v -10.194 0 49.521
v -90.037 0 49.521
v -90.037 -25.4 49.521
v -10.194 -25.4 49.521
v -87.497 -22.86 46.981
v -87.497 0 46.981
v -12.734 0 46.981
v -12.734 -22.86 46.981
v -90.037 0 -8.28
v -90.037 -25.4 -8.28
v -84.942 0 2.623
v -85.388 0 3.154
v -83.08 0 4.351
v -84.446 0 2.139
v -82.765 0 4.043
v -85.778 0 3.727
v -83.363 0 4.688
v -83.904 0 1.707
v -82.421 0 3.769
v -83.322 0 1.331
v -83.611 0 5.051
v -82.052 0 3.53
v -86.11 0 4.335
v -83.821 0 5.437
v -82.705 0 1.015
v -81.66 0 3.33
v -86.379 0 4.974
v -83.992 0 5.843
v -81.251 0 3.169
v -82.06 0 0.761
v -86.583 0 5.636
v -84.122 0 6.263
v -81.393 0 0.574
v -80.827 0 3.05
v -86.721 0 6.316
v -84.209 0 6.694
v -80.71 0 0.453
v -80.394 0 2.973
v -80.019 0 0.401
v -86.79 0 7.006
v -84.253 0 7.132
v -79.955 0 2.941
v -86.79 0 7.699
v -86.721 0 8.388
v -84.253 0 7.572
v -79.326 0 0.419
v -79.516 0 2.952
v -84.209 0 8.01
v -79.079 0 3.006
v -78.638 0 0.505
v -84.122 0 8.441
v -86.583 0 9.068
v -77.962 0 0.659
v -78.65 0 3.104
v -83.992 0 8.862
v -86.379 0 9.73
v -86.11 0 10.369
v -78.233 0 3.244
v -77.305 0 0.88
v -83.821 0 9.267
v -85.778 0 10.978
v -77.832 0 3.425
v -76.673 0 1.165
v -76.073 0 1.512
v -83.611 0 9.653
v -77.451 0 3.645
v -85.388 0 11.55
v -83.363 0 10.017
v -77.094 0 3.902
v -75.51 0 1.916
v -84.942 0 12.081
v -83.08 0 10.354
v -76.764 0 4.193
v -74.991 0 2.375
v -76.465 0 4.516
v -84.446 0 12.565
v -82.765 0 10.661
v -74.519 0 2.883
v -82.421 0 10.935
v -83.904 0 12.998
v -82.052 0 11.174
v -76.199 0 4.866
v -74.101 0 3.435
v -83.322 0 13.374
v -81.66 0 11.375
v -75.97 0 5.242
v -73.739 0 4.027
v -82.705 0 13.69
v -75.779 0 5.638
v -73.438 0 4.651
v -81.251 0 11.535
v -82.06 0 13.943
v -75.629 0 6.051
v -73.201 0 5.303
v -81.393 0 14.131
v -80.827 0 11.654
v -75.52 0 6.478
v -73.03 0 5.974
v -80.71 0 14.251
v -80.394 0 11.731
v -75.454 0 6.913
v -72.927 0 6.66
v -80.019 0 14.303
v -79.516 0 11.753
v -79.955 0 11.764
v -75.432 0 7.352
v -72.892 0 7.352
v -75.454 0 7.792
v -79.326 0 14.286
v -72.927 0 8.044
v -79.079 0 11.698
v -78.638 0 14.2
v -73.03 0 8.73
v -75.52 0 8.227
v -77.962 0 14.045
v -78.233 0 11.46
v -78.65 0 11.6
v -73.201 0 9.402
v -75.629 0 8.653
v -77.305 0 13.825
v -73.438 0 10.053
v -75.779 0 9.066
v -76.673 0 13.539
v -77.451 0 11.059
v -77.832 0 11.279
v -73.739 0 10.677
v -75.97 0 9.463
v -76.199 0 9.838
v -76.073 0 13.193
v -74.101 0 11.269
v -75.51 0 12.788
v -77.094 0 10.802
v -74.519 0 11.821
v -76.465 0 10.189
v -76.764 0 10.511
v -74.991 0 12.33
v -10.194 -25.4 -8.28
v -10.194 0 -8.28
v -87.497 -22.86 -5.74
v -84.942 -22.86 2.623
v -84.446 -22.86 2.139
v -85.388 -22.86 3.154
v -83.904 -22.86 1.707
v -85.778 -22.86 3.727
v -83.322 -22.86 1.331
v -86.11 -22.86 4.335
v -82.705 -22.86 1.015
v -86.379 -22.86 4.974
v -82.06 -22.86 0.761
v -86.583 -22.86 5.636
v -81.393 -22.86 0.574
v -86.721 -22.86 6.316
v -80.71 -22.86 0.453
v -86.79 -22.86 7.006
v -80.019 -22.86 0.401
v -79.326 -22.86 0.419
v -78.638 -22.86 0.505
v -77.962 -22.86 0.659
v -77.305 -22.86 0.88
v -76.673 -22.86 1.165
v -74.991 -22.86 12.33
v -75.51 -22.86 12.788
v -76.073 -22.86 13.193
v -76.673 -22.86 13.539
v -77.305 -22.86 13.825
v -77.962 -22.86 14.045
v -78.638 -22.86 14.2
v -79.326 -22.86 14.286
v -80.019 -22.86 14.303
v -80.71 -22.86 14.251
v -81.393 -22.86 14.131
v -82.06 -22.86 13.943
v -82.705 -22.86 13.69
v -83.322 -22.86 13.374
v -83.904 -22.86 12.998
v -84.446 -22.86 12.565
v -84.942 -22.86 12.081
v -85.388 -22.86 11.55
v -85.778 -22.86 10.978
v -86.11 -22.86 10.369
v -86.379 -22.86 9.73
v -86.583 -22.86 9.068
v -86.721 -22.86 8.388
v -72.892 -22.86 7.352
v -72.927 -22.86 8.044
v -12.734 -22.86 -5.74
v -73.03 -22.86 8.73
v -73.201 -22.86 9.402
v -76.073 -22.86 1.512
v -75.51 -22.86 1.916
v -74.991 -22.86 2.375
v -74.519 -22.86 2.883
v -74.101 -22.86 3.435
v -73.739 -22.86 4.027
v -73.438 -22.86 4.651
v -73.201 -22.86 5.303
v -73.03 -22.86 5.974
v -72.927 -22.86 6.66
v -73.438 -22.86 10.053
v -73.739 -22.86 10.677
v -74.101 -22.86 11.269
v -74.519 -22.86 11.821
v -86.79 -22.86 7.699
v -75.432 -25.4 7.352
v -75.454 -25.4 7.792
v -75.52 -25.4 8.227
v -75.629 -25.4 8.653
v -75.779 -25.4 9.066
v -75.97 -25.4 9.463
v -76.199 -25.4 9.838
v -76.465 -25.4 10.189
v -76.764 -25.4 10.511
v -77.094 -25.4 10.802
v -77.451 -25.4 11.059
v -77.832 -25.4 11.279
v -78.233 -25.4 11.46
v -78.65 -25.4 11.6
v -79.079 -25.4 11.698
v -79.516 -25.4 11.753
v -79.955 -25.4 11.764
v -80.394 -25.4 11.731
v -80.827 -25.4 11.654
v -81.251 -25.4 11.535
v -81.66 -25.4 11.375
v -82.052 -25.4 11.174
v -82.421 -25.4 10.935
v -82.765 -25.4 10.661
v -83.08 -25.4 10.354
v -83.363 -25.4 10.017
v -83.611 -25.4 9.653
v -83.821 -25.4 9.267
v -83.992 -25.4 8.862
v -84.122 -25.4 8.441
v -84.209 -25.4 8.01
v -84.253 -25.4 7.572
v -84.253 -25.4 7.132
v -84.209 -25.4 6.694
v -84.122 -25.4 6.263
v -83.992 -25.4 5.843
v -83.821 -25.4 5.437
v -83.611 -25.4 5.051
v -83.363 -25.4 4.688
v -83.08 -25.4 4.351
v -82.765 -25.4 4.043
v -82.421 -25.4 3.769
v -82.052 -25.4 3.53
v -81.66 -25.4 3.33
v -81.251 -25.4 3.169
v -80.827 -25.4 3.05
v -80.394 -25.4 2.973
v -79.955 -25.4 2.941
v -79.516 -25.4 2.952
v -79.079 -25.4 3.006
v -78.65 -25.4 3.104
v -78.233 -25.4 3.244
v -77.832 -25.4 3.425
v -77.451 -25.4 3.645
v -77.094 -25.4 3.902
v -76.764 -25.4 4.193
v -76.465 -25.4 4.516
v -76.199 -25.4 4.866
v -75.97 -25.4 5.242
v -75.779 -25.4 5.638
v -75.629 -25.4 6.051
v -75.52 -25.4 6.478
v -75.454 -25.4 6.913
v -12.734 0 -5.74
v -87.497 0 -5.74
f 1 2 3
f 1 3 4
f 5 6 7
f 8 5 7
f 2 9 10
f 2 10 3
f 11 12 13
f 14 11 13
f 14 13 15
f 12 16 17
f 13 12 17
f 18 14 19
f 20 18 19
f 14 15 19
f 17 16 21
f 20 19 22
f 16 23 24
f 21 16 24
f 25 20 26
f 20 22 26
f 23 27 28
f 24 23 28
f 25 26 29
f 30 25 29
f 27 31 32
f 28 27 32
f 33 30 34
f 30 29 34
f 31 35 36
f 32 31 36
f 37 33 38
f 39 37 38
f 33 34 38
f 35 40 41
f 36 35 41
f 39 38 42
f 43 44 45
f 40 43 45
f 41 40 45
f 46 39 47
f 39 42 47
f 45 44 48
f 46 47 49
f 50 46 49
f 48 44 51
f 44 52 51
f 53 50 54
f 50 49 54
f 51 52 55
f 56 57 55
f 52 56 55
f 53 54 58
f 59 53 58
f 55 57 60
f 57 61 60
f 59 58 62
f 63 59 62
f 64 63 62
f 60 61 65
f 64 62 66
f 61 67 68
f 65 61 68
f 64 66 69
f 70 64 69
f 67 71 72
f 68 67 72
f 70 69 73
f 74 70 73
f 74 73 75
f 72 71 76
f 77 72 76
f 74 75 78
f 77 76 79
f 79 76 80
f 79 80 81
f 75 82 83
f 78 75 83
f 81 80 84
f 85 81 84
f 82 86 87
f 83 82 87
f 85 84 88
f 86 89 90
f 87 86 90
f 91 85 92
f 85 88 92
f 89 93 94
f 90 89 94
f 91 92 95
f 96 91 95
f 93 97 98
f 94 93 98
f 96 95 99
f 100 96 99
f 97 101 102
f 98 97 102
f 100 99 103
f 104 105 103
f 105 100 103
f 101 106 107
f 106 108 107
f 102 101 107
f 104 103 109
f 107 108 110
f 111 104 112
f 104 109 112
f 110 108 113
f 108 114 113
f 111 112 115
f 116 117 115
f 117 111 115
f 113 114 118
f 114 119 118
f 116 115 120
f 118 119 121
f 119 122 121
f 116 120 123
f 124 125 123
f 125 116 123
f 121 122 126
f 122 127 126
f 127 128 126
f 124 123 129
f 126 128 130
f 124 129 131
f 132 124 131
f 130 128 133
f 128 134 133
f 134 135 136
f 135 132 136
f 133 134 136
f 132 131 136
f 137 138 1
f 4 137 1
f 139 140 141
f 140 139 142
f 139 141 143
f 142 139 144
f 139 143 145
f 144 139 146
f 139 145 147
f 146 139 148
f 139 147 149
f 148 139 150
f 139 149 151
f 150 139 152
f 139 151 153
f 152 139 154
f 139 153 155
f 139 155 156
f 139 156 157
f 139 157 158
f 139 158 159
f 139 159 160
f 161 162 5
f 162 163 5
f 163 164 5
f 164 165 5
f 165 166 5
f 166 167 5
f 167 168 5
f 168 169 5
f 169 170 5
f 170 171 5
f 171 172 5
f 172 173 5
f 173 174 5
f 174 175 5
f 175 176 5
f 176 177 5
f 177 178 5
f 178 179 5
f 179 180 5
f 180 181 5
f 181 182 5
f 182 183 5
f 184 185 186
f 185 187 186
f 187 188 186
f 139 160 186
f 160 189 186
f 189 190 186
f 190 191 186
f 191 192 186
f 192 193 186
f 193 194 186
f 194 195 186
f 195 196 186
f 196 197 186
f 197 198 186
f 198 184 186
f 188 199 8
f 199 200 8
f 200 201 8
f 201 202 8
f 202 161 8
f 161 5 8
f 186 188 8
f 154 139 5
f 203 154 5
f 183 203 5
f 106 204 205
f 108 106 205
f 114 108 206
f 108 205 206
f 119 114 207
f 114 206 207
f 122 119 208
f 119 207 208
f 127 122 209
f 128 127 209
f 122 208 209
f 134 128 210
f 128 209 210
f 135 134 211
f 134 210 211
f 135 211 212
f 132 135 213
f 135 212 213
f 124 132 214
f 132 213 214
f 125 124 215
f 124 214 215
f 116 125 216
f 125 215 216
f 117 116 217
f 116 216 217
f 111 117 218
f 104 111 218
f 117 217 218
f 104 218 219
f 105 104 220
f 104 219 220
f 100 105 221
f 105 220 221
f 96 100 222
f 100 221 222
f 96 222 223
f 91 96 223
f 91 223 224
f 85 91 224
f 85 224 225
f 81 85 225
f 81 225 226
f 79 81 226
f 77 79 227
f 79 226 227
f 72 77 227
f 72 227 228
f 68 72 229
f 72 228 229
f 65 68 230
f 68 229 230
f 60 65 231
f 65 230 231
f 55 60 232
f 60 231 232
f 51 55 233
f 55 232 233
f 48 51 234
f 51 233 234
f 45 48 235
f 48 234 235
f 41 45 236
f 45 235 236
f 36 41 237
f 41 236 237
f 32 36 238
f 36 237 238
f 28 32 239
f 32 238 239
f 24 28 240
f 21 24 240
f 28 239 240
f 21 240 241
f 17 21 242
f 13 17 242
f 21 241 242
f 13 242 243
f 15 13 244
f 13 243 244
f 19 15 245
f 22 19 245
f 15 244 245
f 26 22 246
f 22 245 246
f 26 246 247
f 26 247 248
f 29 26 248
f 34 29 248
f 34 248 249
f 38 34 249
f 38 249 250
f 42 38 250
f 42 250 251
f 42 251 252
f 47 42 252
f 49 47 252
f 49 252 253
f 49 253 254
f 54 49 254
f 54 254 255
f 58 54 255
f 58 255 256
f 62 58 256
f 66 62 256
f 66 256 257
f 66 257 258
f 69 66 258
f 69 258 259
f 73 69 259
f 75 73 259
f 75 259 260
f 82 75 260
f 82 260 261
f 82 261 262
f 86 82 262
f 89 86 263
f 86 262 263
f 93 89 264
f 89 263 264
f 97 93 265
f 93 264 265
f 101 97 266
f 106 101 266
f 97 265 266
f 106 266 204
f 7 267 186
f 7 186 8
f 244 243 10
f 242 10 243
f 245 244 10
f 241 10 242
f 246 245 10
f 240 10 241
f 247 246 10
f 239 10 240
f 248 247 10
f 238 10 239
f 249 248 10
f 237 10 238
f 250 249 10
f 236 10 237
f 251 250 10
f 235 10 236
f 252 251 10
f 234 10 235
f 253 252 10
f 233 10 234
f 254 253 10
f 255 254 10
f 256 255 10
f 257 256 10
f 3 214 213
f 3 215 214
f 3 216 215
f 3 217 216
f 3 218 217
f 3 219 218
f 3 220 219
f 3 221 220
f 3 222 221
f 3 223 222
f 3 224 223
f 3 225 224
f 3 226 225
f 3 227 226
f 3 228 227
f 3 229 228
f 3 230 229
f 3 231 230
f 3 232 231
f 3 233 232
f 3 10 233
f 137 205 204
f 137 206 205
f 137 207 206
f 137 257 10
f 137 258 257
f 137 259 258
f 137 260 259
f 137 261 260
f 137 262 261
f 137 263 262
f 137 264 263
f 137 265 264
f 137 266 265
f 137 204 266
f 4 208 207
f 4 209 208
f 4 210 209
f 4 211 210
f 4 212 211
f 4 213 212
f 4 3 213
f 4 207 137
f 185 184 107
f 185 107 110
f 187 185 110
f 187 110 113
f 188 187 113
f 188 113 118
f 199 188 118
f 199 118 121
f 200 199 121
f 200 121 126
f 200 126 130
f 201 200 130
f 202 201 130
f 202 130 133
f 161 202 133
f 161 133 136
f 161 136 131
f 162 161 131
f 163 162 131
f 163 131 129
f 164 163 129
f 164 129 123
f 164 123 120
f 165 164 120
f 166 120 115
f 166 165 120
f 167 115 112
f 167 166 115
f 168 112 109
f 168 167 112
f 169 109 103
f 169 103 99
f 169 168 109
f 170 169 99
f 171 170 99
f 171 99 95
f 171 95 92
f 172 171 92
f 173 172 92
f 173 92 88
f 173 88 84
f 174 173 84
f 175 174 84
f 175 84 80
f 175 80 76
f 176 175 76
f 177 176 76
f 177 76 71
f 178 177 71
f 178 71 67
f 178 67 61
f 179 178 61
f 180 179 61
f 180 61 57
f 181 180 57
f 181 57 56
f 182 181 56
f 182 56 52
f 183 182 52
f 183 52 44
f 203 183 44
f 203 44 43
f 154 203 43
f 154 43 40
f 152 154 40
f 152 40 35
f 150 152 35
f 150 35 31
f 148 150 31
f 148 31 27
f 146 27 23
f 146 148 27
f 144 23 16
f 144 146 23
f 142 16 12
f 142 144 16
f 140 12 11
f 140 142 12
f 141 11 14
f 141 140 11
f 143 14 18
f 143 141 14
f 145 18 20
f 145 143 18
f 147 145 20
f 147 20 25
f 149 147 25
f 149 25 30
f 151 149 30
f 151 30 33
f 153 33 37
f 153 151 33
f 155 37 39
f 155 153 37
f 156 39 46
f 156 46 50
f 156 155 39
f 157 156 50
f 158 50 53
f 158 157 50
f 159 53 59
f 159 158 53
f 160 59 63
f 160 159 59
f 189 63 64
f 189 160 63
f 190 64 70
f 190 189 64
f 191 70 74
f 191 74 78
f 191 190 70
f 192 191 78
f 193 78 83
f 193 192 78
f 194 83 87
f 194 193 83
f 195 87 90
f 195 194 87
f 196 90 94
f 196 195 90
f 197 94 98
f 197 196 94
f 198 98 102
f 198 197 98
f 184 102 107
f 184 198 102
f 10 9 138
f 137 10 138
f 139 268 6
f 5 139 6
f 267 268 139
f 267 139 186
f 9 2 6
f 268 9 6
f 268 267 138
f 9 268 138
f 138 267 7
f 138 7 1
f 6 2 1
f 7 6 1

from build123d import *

# Parameters (mm, degrees)
F0_W     = 79.84292
F0_H     = 57.80068
F1_DEPTH = 25.4
F2_R     = 4.412951
F3_DEPTH = 25.4
F4_T     = -2.54


with BuildPart() as f1:
    # F0 (on Front) → F1 (new body)
    with BuildSketch(Plane.XZ):
        with Locations((-50.115223, 20.620596)):
            Rectangle(F0_W, F0_H)
    extrude(amount=F1_DEPTH)

    # F2 (on face) → F3 (cut)
    with BuildSketch(Plane.XZ.offset(25.4)):
        with Locations((-79.845399, 7.352189)):
            Circle(F2_R)
    extrude(amount=-F3_DEPTH, mode=Mode.SUBTRACT)

    # F4
    f4_openings = [f1.faces().sort_by_distance(p)[0] for p in [
        (-49.715801, 0, 20.798856),
    ]]
    offset(amount=F4_T, openings=f4_openings)


solid = f1.part
